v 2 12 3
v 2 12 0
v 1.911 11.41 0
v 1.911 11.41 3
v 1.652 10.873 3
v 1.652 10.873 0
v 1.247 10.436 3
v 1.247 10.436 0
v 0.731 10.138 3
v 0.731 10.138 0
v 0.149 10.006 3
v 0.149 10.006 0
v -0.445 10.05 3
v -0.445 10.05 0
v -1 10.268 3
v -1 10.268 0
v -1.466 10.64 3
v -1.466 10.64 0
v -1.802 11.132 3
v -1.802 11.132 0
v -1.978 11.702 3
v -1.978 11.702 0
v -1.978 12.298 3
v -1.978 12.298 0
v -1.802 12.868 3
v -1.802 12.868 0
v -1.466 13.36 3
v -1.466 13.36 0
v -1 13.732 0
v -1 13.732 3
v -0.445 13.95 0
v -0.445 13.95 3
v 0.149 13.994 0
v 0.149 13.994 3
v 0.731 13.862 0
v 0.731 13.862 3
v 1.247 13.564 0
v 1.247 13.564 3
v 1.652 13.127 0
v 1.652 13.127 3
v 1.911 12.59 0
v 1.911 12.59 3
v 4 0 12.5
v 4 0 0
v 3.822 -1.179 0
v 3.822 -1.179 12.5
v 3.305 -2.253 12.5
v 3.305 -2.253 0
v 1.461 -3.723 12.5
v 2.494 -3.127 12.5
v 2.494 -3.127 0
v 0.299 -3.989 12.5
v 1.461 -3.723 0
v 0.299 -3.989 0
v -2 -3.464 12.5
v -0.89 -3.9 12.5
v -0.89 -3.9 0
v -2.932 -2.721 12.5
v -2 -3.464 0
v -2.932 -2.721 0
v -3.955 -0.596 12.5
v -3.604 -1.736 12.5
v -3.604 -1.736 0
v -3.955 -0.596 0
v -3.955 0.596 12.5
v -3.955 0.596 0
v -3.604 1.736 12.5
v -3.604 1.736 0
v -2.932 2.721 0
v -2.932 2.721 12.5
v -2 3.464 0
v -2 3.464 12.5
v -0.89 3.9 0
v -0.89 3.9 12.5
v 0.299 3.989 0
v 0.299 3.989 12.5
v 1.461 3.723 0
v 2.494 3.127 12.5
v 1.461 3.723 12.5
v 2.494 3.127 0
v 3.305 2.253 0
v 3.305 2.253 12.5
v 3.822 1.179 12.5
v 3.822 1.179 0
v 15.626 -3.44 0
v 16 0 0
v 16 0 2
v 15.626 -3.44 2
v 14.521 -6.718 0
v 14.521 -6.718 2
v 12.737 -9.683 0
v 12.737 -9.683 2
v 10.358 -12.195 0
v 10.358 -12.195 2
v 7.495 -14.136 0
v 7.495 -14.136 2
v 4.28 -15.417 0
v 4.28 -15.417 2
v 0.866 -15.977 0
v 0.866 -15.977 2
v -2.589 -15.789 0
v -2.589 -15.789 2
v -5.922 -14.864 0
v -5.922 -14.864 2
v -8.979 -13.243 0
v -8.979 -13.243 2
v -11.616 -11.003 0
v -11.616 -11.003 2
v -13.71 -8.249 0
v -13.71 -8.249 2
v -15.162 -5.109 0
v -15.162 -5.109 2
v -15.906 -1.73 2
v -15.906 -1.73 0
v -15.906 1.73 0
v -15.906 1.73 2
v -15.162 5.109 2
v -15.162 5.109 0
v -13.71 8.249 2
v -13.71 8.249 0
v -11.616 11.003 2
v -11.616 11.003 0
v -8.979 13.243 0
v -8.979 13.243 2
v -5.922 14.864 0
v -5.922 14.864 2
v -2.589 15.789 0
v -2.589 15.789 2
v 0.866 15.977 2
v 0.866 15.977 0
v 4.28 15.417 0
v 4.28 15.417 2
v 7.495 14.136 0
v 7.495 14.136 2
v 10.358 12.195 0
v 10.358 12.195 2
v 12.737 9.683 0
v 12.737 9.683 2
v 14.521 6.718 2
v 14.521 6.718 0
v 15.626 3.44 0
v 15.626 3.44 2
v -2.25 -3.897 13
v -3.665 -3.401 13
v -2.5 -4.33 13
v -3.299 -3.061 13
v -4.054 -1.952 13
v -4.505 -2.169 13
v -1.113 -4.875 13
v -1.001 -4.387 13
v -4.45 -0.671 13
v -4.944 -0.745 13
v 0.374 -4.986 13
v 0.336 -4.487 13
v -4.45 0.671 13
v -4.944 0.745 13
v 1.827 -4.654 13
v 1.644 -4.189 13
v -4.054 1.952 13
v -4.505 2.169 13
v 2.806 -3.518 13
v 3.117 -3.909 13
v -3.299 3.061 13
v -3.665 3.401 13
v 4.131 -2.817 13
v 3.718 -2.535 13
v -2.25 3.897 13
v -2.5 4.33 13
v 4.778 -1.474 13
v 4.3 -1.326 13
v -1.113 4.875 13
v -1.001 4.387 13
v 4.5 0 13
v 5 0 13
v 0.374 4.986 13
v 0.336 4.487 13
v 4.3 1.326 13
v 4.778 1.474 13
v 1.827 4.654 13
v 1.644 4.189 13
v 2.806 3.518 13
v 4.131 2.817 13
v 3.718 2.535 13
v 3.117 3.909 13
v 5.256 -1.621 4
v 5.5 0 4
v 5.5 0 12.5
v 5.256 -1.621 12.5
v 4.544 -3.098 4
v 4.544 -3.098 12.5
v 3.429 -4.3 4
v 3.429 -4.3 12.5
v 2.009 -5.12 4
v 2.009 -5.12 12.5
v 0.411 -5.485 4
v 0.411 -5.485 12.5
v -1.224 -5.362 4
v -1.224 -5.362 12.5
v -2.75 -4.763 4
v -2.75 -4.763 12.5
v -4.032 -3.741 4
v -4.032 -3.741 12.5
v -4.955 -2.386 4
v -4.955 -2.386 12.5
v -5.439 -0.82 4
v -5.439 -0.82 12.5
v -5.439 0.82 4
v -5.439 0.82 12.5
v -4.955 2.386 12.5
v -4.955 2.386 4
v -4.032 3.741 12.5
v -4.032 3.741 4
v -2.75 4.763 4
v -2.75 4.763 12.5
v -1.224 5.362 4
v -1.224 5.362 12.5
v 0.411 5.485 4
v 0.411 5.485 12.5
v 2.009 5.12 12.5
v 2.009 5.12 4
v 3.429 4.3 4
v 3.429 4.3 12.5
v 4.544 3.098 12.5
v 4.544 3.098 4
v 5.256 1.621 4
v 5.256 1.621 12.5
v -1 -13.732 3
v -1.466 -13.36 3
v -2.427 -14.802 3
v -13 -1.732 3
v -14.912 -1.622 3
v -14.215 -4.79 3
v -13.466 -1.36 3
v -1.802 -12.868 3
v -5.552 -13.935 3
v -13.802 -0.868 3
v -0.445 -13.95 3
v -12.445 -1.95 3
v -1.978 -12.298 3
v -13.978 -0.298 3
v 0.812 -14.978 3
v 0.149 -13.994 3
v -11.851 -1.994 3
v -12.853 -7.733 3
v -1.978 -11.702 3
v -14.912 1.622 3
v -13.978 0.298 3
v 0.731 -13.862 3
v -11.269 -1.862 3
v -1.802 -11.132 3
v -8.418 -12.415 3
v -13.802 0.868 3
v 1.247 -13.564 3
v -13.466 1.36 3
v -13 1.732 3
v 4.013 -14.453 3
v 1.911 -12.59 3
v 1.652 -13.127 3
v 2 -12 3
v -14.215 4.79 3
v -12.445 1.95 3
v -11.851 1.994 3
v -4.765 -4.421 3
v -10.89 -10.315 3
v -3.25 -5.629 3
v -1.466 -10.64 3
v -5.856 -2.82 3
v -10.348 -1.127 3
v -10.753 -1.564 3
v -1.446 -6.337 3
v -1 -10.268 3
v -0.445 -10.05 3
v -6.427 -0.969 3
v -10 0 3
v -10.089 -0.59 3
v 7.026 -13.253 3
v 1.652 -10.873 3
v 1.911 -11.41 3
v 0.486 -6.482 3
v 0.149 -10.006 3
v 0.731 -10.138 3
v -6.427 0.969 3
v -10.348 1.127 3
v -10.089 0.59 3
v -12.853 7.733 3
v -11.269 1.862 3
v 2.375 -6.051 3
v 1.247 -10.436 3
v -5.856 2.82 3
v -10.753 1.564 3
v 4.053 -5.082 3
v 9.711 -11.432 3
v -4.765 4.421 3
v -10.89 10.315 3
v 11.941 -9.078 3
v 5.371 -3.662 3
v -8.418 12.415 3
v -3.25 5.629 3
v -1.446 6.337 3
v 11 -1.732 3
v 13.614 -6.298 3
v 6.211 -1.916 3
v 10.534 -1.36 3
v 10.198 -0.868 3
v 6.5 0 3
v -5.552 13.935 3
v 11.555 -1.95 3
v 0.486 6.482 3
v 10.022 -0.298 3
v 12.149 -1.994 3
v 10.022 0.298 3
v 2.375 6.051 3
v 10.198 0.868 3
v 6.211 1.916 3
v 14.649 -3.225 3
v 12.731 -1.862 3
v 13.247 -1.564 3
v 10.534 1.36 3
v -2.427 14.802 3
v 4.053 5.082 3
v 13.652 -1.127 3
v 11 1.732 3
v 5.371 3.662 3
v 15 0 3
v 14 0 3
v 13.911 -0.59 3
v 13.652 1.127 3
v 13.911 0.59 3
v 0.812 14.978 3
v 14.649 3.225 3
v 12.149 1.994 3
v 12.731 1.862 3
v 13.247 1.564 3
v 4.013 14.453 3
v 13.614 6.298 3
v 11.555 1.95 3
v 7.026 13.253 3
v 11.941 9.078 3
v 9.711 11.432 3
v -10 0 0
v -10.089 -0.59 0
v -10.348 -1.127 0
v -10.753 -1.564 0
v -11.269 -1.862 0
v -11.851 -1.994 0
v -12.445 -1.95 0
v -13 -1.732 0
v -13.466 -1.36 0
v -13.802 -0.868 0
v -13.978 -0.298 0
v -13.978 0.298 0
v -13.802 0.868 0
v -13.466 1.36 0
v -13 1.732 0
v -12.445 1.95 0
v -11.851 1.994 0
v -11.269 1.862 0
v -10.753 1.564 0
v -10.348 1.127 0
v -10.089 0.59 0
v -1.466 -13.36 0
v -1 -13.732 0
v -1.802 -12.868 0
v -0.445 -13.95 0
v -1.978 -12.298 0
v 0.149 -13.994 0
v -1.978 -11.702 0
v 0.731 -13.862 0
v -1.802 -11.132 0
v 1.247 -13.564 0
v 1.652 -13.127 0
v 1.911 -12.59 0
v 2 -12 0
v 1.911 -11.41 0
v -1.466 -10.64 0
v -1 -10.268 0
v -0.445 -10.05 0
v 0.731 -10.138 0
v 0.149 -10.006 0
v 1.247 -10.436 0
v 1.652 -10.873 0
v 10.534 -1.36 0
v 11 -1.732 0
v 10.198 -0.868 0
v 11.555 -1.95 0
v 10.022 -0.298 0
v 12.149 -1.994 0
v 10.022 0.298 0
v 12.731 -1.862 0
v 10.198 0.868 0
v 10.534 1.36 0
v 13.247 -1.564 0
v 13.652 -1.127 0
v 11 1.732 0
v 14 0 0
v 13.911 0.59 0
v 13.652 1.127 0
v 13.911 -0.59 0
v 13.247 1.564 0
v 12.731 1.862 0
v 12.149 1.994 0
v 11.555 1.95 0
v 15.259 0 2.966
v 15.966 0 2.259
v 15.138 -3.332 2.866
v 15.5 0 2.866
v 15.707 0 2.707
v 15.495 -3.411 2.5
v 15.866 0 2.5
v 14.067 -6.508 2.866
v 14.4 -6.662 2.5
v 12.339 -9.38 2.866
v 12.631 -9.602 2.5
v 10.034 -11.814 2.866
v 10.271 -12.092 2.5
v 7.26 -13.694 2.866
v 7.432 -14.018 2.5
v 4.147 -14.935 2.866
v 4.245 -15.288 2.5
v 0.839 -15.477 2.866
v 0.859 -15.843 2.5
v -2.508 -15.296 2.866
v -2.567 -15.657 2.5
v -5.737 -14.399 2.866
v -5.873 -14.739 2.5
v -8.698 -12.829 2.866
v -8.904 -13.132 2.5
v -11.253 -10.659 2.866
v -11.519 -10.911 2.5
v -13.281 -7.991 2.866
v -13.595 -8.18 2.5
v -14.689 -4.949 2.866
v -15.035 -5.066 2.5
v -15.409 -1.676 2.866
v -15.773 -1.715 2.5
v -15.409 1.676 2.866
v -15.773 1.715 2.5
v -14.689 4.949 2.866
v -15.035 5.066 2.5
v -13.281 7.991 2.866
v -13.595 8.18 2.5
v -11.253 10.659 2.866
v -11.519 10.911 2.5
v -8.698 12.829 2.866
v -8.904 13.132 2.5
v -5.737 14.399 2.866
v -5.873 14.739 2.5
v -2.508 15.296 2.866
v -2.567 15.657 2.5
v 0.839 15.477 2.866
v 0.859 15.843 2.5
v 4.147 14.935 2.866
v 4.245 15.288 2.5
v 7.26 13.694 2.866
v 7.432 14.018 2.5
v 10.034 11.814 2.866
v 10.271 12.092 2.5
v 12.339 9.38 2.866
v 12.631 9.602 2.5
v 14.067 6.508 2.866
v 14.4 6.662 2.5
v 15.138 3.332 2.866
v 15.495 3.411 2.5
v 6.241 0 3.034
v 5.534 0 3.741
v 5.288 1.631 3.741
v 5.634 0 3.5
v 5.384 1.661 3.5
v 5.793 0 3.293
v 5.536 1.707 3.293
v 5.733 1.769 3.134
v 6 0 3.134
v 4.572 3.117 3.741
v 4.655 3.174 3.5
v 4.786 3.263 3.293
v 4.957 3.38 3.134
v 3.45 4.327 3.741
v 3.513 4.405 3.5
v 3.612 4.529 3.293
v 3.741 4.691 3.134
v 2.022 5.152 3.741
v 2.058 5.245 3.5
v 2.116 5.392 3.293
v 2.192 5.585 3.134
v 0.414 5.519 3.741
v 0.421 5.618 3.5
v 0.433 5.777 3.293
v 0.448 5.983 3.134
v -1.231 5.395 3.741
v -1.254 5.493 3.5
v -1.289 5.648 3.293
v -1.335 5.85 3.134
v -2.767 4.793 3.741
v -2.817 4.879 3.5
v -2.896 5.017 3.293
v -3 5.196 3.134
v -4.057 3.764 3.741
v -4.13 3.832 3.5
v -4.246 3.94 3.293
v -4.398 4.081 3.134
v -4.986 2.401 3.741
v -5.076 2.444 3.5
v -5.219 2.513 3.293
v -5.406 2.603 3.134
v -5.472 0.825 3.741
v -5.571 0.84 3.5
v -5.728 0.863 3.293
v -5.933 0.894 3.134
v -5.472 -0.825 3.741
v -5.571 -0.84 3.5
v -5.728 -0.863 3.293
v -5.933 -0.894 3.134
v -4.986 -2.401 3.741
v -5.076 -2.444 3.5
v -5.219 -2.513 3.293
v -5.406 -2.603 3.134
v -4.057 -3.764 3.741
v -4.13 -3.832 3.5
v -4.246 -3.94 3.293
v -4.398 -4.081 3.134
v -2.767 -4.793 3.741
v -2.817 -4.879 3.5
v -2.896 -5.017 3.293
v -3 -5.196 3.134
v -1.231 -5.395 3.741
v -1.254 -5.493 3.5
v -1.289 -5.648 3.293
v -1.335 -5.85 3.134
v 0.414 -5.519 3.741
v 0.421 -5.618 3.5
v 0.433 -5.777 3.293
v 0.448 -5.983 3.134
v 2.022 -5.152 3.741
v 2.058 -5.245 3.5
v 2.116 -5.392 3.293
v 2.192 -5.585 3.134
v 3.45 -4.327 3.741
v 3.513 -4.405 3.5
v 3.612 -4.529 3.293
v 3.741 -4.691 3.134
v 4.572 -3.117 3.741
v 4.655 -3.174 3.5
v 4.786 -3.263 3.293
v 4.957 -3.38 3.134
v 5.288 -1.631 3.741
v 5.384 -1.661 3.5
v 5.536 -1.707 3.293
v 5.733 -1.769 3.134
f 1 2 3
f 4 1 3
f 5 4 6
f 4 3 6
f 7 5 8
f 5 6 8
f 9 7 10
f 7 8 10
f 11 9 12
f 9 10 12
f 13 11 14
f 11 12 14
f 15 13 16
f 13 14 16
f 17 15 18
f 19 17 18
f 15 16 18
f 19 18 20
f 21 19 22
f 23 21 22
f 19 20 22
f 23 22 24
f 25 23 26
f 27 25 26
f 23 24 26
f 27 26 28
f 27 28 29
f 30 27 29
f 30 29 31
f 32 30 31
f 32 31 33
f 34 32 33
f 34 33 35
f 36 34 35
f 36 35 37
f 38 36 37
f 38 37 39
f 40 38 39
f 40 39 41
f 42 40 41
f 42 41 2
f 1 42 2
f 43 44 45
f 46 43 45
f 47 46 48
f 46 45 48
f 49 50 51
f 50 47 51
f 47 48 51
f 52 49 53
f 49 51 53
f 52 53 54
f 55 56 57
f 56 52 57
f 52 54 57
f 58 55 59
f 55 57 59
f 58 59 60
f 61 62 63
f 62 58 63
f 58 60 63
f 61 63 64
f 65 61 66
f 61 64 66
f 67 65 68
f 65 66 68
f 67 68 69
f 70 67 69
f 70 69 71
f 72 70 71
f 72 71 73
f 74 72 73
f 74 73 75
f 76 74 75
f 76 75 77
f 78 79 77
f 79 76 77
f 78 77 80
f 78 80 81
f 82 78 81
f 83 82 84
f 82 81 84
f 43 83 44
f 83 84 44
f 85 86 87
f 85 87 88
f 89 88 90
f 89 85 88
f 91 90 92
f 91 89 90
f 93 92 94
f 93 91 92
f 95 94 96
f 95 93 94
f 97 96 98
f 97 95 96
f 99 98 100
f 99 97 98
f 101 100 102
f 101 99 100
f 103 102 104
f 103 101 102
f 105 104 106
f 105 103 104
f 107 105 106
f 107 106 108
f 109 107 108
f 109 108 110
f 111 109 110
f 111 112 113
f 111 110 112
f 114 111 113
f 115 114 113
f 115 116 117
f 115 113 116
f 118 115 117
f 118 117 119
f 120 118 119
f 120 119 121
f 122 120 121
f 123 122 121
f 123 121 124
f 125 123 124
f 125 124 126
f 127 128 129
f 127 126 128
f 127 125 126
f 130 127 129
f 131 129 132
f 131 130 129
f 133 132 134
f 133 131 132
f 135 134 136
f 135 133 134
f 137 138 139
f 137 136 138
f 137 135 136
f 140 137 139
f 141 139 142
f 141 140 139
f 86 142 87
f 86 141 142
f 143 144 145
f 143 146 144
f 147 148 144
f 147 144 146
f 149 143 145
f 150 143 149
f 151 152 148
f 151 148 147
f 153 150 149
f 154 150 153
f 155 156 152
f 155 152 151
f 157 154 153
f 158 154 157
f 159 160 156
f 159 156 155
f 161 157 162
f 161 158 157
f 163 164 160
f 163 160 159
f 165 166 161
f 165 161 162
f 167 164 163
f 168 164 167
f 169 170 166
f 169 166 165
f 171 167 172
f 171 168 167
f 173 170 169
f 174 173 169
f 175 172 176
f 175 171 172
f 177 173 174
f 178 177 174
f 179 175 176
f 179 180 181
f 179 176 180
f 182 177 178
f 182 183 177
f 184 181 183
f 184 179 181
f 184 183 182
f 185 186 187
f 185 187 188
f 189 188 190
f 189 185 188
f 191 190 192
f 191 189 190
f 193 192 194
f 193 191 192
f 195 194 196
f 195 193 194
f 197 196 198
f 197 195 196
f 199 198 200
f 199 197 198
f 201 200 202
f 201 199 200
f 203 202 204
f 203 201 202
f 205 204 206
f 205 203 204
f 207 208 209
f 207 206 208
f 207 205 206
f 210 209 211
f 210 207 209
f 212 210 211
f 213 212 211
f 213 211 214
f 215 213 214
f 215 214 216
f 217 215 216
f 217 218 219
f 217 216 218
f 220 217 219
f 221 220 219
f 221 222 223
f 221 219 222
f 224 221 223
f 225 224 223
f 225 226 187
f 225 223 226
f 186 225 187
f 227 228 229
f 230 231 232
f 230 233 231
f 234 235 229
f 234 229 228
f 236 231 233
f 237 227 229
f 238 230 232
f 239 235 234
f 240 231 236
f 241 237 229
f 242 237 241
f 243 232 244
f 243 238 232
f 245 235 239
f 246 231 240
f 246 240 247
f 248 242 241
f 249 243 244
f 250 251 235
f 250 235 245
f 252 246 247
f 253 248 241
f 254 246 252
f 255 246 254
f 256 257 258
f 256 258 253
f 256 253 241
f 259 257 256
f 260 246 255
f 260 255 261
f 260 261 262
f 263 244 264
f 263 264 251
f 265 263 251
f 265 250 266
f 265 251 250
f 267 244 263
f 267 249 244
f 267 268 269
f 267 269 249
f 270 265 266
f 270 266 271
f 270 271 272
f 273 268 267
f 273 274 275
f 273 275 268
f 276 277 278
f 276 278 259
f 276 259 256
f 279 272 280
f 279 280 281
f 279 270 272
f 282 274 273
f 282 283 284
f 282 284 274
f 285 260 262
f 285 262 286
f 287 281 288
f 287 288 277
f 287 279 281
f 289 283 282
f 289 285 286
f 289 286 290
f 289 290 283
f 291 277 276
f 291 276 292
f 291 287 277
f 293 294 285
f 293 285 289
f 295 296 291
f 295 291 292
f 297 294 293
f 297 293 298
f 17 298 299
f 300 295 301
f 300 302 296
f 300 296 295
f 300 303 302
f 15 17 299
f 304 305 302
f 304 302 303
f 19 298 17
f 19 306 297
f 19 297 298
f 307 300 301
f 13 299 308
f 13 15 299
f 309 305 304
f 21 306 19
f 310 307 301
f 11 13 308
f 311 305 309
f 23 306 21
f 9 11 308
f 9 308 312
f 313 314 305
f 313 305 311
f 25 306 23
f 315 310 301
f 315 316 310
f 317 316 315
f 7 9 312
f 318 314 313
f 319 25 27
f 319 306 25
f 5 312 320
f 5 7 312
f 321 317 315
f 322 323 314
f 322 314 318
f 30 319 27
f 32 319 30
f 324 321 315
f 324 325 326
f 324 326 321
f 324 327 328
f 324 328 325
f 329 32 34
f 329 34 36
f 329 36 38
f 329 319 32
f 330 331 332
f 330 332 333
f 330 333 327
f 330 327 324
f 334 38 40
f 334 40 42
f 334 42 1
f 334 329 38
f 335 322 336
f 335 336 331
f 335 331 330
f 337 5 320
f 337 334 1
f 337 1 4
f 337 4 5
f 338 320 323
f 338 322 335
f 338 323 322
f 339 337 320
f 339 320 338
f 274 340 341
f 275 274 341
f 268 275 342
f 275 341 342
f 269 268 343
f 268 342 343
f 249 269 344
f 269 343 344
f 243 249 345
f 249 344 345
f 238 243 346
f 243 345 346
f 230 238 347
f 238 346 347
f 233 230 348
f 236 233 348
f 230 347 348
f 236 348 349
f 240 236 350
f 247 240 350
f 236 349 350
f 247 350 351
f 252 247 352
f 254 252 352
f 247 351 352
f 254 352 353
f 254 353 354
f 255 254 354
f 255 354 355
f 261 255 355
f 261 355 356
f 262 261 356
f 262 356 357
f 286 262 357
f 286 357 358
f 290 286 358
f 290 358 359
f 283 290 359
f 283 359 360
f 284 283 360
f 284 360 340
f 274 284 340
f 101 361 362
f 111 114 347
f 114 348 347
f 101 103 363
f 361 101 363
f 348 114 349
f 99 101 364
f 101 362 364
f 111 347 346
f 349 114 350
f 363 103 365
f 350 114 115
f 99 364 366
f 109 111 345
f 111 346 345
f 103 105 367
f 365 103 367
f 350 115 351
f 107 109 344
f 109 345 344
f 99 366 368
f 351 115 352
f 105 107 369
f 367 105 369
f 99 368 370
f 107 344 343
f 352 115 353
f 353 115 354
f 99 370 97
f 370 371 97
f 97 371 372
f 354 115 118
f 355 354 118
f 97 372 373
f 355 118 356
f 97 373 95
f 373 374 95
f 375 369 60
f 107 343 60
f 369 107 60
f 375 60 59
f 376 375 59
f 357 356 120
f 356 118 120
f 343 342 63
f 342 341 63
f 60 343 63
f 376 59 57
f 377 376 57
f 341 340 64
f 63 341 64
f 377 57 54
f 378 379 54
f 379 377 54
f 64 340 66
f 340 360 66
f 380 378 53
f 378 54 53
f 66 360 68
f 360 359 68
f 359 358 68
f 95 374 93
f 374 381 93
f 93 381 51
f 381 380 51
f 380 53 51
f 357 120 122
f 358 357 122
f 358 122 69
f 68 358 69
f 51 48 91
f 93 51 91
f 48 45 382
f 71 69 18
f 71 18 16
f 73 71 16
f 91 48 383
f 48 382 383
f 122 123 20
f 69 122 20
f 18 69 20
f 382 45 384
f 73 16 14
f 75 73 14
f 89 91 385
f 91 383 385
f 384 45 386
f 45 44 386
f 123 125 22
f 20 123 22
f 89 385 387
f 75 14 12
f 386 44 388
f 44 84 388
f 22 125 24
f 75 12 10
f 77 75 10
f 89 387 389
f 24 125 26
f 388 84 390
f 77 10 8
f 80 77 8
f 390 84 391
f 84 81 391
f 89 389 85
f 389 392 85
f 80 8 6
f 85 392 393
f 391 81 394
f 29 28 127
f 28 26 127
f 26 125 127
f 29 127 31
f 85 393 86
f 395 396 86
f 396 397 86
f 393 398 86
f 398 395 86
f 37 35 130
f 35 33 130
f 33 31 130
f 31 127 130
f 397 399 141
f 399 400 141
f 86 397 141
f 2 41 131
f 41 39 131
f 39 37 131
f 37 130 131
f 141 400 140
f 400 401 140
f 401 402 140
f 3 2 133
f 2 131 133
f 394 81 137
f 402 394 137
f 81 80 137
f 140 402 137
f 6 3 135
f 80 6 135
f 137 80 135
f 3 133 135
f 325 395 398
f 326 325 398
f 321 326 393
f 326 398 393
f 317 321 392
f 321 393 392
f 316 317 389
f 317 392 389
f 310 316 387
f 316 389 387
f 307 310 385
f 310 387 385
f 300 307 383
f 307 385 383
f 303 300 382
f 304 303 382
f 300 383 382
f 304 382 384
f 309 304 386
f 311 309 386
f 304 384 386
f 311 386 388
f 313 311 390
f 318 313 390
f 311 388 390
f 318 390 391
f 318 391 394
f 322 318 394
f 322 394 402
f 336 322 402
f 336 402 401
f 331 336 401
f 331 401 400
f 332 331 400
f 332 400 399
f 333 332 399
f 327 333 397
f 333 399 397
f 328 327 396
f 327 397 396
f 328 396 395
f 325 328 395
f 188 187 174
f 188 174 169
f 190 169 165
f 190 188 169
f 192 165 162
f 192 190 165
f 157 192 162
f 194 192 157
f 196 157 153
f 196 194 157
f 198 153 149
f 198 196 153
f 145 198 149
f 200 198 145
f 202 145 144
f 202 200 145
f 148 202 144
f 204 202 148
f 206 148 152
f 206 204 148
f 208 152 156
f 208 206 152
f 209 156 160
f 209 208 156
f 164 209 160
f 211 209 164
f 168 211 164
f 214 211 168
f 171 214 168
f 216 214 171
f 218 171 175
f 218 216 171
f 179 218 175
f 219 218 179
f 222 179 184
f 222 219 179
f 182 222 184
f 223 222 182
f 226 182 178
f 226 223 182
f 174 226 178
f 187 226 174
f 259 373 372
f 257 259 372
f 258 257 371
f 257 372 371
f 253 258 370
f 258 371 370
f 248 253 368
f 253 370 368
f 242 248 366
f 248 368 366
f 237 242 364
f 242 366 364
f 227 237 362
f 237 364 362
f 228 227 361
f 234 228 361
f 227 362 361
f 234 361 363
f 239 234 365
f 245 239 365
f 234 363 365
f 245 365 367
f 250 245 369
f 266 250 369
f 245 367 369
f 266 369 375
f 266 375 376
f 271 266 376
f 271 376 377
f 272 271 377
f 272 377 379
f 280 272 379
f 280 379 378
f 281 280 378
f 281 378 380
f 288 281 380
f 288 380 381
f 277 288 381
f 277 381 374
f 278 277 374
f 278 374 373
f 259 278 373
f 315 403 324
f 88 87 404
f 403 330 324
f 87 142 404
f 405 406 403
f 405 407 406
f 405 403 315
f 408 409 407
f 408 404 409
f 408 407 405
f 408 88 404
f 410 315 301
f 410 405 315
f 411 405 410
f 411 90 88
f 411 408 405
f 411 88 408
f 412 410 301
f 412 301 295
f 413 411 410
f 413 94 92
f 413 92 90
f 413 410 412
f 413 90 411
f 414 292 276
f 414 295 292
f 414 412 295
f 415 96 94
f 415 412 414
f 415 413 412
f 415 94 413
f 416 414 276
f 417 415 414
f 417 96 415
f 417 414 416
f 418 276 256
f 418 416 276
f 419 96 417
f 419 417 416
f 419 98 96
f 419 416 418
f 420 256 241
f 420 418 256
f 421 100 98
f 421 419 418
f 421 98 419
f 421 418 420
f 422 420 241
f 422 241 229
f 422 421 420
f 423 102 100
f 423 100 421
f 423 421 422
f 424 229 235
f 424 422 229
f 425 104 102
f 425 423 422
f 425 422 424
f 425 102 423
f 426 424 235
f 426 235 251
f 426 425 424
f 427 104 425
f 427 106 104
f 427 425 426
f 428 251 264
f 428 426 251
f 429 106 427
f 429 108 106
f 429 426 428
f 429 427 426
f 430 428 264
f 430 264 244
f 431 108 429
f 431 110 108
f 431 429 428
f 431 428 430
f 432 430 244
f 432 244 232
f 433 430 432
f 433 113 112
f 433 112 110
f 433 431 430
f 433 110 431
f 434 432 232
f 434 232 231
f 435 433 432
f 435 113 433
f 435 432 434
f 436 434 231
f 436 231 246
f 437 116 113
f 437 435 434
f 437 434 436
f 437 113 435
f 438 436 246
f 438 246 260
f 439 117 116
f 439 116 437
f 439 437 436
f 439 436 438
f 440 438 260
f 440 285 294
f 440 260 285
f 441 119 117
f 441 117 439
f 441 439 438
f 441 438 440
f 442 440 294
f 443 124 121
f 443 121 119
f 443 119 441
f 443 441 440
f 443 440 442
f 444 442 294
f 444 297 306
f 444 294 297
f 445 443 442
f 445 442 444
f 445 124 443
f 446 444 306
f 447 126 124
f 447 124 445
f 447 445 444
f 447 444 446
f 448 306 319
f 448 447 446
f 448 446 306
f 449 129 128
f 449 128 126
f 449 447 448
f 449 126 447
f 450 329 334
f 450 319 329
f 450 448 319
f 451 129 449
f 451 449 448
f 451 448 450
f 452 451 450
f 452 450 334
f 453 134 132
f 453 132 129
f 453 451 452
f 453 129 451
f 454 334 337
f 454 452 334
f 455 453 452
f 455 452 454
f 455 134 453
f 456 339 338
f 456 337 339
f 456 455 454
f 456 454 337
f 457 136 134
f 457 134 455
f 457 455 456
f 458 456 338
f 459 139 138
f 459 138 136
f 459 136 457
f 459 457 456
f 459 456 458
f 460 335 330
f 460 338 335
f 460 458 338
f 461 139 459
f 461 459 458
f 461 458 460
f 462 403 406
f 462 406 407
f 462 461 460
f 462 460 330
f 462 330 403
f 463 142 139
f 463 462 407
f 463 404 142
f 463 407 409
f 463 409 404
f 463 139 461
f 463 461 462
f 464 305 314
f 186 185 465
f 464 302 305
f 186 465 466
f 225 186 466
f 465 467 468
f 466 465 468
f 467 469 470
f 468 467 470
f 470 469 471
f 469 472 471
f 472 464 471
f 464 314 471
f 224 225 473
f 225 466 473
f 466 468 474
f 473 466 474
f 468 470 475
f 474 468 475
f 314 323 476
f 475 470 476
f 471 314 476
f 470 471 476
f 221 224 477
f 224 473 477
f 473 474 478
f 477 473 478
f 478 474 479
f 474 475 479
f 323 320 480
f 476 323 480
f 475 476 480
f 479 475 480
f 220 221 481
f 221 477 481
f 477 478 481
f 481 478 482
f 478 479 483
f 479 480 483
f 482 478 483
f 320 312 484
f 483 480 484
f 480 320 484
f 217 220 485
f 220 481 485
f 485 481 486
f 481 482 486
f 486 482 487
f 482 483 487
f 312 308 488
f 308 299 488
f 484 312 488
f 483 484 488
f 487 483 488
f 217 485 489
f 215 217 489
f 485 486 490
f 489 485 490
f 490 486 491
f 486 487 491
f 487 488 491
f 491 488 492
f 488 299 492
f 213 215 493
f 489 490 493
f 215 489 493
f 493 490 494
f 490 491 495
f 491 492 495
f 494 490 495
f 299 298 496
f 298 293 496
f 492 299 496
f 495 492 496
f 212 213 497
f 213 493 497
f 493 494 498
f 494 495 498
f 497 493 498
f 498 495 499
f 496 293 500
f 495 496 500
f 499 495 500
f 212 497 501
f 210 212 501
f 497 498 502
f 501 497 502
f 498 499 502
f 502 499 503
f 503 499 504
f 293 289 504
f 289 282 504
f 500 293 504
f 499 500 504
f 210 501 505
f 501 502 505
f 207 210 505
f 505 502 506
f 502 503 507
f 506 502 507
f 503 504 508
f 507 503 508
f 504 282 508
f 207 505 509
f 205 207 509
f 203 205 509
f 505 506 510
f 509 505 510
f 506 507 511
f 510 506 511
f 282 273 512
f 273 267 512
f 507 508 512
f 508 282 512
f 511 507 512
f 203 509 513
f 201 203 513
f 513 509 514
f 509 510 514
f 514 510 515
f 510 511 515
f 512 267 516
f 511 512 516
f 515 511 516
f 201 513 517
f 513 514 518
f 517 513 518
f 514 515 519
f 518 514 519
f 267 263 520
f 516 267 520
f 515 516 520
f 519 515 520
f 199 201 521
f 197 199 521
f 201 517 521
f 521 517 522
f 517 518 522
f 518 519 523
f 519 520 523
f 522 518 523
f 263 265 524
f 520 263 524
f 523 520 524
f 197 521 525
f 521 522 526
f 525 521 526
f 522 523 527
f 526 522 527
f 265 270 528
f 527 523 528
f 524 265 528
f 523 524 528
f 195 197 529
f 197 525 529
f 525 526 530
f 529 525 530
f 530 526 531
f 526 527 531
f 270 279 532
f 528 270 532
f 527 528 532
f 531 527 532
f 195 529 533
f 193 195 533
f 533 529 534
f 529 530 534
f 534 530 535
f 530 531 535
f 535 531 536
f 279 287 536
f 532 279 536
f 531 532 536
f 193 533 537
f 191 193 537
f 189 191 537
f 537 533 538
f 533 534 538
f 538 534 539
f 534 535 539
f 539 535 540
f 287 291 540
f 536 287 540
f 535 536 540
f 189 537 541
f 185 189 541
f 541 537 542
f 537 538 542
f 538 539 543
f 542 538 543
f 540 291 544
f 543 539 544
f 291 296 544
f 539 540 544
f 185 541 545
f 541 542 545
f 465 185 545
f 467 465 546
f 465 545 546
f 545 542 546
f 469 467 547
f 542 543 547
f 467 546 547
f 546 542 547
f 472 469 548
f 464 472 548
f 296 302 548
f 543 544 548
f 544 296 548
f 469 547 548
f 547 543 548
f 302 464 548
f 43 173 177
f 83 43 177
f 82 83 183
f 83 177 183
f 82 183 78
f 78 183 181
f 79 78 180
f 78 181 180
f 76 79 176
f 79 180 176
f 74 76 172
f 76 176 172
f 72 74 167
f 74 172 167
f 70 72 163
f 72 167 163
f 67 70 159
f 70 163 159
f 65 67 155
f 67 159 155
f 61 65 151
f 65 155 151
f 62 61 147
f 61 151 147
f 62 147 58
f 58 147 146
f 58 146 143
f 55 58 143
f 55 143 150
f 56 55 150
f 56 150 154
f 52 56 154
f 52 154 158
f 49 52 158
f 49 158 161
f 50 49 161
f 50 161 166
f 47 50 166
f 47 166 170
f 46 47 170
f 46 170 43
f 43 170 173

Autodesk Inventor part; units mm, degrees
ref_plane "YZ Plane" through (0, 0, 0) normal (1, 0, 0) x (0, 1, 0)
ref_plane "XZ Plane" through (0, 0, 0) normal (0, 1, 0) x (-1, 0, 0)
ref_plane "XY Plane" through (0, 0, 0) normal (0, 0, 1) x (1, 0, 0)
sketch "Эскиз1" plane through (0, 0, 0) normal (0, 0, 1) x (1, 0, 0)
  circle A0 centre (0, 0) radius 16
  circle A1 centre (0, 0) radius 12
  circle A2 centre (-12, 0) radius 2
  circle A3 centre (0, -12) radius 2
  circle A4 centre (12, 0) radius 2
  circle A5 centre (0, 12) radius 2
  circle A6 centre (0, 0) radius 4
  dimension "d1" = 24
  dimension "d0" = 32
  dimension "d2" = 4
  dimension "d5" = 360
  dimension "d7" = 8
extrude "Выдавливание1" add sketch "Эскиз1" along normal blind 3 contours A0 | A4 A1 A3 A2 A5
sketch "Эскиз2" plane through (0, 0, 3) normal (0, 0, 1) x (1, 0, 0)
  circle A0 centre (0, 0) radius 5.5
  circle A1 centre (0, 0) radius 16 projected
  circle A2 centre (0, 12) radius 2 projected
  circle A3 centre (-12, 0) radius 2 projected
  circle A4 centre (0, -12) radius 2 projected
  circle A5 centre (0, 0) radius 4 projected
  circle A6 centre (12, 0) radius 2 projected
  dimension "d10" = 11
extrude "Выдавливание2" add sketch "Эскиз2" along normal blind 10 contours A0
fillet "Сопряжение1" radius 1 2 edges at (-16, 0, 3) (-5.5, 0, 3)
chamfer "Фаска1" distance 0.5 angle 45 2 edges at (-5.5, 0, 13) (-4, 0, 13)
properties part number "МУФТА НА ВАЛ бол"
